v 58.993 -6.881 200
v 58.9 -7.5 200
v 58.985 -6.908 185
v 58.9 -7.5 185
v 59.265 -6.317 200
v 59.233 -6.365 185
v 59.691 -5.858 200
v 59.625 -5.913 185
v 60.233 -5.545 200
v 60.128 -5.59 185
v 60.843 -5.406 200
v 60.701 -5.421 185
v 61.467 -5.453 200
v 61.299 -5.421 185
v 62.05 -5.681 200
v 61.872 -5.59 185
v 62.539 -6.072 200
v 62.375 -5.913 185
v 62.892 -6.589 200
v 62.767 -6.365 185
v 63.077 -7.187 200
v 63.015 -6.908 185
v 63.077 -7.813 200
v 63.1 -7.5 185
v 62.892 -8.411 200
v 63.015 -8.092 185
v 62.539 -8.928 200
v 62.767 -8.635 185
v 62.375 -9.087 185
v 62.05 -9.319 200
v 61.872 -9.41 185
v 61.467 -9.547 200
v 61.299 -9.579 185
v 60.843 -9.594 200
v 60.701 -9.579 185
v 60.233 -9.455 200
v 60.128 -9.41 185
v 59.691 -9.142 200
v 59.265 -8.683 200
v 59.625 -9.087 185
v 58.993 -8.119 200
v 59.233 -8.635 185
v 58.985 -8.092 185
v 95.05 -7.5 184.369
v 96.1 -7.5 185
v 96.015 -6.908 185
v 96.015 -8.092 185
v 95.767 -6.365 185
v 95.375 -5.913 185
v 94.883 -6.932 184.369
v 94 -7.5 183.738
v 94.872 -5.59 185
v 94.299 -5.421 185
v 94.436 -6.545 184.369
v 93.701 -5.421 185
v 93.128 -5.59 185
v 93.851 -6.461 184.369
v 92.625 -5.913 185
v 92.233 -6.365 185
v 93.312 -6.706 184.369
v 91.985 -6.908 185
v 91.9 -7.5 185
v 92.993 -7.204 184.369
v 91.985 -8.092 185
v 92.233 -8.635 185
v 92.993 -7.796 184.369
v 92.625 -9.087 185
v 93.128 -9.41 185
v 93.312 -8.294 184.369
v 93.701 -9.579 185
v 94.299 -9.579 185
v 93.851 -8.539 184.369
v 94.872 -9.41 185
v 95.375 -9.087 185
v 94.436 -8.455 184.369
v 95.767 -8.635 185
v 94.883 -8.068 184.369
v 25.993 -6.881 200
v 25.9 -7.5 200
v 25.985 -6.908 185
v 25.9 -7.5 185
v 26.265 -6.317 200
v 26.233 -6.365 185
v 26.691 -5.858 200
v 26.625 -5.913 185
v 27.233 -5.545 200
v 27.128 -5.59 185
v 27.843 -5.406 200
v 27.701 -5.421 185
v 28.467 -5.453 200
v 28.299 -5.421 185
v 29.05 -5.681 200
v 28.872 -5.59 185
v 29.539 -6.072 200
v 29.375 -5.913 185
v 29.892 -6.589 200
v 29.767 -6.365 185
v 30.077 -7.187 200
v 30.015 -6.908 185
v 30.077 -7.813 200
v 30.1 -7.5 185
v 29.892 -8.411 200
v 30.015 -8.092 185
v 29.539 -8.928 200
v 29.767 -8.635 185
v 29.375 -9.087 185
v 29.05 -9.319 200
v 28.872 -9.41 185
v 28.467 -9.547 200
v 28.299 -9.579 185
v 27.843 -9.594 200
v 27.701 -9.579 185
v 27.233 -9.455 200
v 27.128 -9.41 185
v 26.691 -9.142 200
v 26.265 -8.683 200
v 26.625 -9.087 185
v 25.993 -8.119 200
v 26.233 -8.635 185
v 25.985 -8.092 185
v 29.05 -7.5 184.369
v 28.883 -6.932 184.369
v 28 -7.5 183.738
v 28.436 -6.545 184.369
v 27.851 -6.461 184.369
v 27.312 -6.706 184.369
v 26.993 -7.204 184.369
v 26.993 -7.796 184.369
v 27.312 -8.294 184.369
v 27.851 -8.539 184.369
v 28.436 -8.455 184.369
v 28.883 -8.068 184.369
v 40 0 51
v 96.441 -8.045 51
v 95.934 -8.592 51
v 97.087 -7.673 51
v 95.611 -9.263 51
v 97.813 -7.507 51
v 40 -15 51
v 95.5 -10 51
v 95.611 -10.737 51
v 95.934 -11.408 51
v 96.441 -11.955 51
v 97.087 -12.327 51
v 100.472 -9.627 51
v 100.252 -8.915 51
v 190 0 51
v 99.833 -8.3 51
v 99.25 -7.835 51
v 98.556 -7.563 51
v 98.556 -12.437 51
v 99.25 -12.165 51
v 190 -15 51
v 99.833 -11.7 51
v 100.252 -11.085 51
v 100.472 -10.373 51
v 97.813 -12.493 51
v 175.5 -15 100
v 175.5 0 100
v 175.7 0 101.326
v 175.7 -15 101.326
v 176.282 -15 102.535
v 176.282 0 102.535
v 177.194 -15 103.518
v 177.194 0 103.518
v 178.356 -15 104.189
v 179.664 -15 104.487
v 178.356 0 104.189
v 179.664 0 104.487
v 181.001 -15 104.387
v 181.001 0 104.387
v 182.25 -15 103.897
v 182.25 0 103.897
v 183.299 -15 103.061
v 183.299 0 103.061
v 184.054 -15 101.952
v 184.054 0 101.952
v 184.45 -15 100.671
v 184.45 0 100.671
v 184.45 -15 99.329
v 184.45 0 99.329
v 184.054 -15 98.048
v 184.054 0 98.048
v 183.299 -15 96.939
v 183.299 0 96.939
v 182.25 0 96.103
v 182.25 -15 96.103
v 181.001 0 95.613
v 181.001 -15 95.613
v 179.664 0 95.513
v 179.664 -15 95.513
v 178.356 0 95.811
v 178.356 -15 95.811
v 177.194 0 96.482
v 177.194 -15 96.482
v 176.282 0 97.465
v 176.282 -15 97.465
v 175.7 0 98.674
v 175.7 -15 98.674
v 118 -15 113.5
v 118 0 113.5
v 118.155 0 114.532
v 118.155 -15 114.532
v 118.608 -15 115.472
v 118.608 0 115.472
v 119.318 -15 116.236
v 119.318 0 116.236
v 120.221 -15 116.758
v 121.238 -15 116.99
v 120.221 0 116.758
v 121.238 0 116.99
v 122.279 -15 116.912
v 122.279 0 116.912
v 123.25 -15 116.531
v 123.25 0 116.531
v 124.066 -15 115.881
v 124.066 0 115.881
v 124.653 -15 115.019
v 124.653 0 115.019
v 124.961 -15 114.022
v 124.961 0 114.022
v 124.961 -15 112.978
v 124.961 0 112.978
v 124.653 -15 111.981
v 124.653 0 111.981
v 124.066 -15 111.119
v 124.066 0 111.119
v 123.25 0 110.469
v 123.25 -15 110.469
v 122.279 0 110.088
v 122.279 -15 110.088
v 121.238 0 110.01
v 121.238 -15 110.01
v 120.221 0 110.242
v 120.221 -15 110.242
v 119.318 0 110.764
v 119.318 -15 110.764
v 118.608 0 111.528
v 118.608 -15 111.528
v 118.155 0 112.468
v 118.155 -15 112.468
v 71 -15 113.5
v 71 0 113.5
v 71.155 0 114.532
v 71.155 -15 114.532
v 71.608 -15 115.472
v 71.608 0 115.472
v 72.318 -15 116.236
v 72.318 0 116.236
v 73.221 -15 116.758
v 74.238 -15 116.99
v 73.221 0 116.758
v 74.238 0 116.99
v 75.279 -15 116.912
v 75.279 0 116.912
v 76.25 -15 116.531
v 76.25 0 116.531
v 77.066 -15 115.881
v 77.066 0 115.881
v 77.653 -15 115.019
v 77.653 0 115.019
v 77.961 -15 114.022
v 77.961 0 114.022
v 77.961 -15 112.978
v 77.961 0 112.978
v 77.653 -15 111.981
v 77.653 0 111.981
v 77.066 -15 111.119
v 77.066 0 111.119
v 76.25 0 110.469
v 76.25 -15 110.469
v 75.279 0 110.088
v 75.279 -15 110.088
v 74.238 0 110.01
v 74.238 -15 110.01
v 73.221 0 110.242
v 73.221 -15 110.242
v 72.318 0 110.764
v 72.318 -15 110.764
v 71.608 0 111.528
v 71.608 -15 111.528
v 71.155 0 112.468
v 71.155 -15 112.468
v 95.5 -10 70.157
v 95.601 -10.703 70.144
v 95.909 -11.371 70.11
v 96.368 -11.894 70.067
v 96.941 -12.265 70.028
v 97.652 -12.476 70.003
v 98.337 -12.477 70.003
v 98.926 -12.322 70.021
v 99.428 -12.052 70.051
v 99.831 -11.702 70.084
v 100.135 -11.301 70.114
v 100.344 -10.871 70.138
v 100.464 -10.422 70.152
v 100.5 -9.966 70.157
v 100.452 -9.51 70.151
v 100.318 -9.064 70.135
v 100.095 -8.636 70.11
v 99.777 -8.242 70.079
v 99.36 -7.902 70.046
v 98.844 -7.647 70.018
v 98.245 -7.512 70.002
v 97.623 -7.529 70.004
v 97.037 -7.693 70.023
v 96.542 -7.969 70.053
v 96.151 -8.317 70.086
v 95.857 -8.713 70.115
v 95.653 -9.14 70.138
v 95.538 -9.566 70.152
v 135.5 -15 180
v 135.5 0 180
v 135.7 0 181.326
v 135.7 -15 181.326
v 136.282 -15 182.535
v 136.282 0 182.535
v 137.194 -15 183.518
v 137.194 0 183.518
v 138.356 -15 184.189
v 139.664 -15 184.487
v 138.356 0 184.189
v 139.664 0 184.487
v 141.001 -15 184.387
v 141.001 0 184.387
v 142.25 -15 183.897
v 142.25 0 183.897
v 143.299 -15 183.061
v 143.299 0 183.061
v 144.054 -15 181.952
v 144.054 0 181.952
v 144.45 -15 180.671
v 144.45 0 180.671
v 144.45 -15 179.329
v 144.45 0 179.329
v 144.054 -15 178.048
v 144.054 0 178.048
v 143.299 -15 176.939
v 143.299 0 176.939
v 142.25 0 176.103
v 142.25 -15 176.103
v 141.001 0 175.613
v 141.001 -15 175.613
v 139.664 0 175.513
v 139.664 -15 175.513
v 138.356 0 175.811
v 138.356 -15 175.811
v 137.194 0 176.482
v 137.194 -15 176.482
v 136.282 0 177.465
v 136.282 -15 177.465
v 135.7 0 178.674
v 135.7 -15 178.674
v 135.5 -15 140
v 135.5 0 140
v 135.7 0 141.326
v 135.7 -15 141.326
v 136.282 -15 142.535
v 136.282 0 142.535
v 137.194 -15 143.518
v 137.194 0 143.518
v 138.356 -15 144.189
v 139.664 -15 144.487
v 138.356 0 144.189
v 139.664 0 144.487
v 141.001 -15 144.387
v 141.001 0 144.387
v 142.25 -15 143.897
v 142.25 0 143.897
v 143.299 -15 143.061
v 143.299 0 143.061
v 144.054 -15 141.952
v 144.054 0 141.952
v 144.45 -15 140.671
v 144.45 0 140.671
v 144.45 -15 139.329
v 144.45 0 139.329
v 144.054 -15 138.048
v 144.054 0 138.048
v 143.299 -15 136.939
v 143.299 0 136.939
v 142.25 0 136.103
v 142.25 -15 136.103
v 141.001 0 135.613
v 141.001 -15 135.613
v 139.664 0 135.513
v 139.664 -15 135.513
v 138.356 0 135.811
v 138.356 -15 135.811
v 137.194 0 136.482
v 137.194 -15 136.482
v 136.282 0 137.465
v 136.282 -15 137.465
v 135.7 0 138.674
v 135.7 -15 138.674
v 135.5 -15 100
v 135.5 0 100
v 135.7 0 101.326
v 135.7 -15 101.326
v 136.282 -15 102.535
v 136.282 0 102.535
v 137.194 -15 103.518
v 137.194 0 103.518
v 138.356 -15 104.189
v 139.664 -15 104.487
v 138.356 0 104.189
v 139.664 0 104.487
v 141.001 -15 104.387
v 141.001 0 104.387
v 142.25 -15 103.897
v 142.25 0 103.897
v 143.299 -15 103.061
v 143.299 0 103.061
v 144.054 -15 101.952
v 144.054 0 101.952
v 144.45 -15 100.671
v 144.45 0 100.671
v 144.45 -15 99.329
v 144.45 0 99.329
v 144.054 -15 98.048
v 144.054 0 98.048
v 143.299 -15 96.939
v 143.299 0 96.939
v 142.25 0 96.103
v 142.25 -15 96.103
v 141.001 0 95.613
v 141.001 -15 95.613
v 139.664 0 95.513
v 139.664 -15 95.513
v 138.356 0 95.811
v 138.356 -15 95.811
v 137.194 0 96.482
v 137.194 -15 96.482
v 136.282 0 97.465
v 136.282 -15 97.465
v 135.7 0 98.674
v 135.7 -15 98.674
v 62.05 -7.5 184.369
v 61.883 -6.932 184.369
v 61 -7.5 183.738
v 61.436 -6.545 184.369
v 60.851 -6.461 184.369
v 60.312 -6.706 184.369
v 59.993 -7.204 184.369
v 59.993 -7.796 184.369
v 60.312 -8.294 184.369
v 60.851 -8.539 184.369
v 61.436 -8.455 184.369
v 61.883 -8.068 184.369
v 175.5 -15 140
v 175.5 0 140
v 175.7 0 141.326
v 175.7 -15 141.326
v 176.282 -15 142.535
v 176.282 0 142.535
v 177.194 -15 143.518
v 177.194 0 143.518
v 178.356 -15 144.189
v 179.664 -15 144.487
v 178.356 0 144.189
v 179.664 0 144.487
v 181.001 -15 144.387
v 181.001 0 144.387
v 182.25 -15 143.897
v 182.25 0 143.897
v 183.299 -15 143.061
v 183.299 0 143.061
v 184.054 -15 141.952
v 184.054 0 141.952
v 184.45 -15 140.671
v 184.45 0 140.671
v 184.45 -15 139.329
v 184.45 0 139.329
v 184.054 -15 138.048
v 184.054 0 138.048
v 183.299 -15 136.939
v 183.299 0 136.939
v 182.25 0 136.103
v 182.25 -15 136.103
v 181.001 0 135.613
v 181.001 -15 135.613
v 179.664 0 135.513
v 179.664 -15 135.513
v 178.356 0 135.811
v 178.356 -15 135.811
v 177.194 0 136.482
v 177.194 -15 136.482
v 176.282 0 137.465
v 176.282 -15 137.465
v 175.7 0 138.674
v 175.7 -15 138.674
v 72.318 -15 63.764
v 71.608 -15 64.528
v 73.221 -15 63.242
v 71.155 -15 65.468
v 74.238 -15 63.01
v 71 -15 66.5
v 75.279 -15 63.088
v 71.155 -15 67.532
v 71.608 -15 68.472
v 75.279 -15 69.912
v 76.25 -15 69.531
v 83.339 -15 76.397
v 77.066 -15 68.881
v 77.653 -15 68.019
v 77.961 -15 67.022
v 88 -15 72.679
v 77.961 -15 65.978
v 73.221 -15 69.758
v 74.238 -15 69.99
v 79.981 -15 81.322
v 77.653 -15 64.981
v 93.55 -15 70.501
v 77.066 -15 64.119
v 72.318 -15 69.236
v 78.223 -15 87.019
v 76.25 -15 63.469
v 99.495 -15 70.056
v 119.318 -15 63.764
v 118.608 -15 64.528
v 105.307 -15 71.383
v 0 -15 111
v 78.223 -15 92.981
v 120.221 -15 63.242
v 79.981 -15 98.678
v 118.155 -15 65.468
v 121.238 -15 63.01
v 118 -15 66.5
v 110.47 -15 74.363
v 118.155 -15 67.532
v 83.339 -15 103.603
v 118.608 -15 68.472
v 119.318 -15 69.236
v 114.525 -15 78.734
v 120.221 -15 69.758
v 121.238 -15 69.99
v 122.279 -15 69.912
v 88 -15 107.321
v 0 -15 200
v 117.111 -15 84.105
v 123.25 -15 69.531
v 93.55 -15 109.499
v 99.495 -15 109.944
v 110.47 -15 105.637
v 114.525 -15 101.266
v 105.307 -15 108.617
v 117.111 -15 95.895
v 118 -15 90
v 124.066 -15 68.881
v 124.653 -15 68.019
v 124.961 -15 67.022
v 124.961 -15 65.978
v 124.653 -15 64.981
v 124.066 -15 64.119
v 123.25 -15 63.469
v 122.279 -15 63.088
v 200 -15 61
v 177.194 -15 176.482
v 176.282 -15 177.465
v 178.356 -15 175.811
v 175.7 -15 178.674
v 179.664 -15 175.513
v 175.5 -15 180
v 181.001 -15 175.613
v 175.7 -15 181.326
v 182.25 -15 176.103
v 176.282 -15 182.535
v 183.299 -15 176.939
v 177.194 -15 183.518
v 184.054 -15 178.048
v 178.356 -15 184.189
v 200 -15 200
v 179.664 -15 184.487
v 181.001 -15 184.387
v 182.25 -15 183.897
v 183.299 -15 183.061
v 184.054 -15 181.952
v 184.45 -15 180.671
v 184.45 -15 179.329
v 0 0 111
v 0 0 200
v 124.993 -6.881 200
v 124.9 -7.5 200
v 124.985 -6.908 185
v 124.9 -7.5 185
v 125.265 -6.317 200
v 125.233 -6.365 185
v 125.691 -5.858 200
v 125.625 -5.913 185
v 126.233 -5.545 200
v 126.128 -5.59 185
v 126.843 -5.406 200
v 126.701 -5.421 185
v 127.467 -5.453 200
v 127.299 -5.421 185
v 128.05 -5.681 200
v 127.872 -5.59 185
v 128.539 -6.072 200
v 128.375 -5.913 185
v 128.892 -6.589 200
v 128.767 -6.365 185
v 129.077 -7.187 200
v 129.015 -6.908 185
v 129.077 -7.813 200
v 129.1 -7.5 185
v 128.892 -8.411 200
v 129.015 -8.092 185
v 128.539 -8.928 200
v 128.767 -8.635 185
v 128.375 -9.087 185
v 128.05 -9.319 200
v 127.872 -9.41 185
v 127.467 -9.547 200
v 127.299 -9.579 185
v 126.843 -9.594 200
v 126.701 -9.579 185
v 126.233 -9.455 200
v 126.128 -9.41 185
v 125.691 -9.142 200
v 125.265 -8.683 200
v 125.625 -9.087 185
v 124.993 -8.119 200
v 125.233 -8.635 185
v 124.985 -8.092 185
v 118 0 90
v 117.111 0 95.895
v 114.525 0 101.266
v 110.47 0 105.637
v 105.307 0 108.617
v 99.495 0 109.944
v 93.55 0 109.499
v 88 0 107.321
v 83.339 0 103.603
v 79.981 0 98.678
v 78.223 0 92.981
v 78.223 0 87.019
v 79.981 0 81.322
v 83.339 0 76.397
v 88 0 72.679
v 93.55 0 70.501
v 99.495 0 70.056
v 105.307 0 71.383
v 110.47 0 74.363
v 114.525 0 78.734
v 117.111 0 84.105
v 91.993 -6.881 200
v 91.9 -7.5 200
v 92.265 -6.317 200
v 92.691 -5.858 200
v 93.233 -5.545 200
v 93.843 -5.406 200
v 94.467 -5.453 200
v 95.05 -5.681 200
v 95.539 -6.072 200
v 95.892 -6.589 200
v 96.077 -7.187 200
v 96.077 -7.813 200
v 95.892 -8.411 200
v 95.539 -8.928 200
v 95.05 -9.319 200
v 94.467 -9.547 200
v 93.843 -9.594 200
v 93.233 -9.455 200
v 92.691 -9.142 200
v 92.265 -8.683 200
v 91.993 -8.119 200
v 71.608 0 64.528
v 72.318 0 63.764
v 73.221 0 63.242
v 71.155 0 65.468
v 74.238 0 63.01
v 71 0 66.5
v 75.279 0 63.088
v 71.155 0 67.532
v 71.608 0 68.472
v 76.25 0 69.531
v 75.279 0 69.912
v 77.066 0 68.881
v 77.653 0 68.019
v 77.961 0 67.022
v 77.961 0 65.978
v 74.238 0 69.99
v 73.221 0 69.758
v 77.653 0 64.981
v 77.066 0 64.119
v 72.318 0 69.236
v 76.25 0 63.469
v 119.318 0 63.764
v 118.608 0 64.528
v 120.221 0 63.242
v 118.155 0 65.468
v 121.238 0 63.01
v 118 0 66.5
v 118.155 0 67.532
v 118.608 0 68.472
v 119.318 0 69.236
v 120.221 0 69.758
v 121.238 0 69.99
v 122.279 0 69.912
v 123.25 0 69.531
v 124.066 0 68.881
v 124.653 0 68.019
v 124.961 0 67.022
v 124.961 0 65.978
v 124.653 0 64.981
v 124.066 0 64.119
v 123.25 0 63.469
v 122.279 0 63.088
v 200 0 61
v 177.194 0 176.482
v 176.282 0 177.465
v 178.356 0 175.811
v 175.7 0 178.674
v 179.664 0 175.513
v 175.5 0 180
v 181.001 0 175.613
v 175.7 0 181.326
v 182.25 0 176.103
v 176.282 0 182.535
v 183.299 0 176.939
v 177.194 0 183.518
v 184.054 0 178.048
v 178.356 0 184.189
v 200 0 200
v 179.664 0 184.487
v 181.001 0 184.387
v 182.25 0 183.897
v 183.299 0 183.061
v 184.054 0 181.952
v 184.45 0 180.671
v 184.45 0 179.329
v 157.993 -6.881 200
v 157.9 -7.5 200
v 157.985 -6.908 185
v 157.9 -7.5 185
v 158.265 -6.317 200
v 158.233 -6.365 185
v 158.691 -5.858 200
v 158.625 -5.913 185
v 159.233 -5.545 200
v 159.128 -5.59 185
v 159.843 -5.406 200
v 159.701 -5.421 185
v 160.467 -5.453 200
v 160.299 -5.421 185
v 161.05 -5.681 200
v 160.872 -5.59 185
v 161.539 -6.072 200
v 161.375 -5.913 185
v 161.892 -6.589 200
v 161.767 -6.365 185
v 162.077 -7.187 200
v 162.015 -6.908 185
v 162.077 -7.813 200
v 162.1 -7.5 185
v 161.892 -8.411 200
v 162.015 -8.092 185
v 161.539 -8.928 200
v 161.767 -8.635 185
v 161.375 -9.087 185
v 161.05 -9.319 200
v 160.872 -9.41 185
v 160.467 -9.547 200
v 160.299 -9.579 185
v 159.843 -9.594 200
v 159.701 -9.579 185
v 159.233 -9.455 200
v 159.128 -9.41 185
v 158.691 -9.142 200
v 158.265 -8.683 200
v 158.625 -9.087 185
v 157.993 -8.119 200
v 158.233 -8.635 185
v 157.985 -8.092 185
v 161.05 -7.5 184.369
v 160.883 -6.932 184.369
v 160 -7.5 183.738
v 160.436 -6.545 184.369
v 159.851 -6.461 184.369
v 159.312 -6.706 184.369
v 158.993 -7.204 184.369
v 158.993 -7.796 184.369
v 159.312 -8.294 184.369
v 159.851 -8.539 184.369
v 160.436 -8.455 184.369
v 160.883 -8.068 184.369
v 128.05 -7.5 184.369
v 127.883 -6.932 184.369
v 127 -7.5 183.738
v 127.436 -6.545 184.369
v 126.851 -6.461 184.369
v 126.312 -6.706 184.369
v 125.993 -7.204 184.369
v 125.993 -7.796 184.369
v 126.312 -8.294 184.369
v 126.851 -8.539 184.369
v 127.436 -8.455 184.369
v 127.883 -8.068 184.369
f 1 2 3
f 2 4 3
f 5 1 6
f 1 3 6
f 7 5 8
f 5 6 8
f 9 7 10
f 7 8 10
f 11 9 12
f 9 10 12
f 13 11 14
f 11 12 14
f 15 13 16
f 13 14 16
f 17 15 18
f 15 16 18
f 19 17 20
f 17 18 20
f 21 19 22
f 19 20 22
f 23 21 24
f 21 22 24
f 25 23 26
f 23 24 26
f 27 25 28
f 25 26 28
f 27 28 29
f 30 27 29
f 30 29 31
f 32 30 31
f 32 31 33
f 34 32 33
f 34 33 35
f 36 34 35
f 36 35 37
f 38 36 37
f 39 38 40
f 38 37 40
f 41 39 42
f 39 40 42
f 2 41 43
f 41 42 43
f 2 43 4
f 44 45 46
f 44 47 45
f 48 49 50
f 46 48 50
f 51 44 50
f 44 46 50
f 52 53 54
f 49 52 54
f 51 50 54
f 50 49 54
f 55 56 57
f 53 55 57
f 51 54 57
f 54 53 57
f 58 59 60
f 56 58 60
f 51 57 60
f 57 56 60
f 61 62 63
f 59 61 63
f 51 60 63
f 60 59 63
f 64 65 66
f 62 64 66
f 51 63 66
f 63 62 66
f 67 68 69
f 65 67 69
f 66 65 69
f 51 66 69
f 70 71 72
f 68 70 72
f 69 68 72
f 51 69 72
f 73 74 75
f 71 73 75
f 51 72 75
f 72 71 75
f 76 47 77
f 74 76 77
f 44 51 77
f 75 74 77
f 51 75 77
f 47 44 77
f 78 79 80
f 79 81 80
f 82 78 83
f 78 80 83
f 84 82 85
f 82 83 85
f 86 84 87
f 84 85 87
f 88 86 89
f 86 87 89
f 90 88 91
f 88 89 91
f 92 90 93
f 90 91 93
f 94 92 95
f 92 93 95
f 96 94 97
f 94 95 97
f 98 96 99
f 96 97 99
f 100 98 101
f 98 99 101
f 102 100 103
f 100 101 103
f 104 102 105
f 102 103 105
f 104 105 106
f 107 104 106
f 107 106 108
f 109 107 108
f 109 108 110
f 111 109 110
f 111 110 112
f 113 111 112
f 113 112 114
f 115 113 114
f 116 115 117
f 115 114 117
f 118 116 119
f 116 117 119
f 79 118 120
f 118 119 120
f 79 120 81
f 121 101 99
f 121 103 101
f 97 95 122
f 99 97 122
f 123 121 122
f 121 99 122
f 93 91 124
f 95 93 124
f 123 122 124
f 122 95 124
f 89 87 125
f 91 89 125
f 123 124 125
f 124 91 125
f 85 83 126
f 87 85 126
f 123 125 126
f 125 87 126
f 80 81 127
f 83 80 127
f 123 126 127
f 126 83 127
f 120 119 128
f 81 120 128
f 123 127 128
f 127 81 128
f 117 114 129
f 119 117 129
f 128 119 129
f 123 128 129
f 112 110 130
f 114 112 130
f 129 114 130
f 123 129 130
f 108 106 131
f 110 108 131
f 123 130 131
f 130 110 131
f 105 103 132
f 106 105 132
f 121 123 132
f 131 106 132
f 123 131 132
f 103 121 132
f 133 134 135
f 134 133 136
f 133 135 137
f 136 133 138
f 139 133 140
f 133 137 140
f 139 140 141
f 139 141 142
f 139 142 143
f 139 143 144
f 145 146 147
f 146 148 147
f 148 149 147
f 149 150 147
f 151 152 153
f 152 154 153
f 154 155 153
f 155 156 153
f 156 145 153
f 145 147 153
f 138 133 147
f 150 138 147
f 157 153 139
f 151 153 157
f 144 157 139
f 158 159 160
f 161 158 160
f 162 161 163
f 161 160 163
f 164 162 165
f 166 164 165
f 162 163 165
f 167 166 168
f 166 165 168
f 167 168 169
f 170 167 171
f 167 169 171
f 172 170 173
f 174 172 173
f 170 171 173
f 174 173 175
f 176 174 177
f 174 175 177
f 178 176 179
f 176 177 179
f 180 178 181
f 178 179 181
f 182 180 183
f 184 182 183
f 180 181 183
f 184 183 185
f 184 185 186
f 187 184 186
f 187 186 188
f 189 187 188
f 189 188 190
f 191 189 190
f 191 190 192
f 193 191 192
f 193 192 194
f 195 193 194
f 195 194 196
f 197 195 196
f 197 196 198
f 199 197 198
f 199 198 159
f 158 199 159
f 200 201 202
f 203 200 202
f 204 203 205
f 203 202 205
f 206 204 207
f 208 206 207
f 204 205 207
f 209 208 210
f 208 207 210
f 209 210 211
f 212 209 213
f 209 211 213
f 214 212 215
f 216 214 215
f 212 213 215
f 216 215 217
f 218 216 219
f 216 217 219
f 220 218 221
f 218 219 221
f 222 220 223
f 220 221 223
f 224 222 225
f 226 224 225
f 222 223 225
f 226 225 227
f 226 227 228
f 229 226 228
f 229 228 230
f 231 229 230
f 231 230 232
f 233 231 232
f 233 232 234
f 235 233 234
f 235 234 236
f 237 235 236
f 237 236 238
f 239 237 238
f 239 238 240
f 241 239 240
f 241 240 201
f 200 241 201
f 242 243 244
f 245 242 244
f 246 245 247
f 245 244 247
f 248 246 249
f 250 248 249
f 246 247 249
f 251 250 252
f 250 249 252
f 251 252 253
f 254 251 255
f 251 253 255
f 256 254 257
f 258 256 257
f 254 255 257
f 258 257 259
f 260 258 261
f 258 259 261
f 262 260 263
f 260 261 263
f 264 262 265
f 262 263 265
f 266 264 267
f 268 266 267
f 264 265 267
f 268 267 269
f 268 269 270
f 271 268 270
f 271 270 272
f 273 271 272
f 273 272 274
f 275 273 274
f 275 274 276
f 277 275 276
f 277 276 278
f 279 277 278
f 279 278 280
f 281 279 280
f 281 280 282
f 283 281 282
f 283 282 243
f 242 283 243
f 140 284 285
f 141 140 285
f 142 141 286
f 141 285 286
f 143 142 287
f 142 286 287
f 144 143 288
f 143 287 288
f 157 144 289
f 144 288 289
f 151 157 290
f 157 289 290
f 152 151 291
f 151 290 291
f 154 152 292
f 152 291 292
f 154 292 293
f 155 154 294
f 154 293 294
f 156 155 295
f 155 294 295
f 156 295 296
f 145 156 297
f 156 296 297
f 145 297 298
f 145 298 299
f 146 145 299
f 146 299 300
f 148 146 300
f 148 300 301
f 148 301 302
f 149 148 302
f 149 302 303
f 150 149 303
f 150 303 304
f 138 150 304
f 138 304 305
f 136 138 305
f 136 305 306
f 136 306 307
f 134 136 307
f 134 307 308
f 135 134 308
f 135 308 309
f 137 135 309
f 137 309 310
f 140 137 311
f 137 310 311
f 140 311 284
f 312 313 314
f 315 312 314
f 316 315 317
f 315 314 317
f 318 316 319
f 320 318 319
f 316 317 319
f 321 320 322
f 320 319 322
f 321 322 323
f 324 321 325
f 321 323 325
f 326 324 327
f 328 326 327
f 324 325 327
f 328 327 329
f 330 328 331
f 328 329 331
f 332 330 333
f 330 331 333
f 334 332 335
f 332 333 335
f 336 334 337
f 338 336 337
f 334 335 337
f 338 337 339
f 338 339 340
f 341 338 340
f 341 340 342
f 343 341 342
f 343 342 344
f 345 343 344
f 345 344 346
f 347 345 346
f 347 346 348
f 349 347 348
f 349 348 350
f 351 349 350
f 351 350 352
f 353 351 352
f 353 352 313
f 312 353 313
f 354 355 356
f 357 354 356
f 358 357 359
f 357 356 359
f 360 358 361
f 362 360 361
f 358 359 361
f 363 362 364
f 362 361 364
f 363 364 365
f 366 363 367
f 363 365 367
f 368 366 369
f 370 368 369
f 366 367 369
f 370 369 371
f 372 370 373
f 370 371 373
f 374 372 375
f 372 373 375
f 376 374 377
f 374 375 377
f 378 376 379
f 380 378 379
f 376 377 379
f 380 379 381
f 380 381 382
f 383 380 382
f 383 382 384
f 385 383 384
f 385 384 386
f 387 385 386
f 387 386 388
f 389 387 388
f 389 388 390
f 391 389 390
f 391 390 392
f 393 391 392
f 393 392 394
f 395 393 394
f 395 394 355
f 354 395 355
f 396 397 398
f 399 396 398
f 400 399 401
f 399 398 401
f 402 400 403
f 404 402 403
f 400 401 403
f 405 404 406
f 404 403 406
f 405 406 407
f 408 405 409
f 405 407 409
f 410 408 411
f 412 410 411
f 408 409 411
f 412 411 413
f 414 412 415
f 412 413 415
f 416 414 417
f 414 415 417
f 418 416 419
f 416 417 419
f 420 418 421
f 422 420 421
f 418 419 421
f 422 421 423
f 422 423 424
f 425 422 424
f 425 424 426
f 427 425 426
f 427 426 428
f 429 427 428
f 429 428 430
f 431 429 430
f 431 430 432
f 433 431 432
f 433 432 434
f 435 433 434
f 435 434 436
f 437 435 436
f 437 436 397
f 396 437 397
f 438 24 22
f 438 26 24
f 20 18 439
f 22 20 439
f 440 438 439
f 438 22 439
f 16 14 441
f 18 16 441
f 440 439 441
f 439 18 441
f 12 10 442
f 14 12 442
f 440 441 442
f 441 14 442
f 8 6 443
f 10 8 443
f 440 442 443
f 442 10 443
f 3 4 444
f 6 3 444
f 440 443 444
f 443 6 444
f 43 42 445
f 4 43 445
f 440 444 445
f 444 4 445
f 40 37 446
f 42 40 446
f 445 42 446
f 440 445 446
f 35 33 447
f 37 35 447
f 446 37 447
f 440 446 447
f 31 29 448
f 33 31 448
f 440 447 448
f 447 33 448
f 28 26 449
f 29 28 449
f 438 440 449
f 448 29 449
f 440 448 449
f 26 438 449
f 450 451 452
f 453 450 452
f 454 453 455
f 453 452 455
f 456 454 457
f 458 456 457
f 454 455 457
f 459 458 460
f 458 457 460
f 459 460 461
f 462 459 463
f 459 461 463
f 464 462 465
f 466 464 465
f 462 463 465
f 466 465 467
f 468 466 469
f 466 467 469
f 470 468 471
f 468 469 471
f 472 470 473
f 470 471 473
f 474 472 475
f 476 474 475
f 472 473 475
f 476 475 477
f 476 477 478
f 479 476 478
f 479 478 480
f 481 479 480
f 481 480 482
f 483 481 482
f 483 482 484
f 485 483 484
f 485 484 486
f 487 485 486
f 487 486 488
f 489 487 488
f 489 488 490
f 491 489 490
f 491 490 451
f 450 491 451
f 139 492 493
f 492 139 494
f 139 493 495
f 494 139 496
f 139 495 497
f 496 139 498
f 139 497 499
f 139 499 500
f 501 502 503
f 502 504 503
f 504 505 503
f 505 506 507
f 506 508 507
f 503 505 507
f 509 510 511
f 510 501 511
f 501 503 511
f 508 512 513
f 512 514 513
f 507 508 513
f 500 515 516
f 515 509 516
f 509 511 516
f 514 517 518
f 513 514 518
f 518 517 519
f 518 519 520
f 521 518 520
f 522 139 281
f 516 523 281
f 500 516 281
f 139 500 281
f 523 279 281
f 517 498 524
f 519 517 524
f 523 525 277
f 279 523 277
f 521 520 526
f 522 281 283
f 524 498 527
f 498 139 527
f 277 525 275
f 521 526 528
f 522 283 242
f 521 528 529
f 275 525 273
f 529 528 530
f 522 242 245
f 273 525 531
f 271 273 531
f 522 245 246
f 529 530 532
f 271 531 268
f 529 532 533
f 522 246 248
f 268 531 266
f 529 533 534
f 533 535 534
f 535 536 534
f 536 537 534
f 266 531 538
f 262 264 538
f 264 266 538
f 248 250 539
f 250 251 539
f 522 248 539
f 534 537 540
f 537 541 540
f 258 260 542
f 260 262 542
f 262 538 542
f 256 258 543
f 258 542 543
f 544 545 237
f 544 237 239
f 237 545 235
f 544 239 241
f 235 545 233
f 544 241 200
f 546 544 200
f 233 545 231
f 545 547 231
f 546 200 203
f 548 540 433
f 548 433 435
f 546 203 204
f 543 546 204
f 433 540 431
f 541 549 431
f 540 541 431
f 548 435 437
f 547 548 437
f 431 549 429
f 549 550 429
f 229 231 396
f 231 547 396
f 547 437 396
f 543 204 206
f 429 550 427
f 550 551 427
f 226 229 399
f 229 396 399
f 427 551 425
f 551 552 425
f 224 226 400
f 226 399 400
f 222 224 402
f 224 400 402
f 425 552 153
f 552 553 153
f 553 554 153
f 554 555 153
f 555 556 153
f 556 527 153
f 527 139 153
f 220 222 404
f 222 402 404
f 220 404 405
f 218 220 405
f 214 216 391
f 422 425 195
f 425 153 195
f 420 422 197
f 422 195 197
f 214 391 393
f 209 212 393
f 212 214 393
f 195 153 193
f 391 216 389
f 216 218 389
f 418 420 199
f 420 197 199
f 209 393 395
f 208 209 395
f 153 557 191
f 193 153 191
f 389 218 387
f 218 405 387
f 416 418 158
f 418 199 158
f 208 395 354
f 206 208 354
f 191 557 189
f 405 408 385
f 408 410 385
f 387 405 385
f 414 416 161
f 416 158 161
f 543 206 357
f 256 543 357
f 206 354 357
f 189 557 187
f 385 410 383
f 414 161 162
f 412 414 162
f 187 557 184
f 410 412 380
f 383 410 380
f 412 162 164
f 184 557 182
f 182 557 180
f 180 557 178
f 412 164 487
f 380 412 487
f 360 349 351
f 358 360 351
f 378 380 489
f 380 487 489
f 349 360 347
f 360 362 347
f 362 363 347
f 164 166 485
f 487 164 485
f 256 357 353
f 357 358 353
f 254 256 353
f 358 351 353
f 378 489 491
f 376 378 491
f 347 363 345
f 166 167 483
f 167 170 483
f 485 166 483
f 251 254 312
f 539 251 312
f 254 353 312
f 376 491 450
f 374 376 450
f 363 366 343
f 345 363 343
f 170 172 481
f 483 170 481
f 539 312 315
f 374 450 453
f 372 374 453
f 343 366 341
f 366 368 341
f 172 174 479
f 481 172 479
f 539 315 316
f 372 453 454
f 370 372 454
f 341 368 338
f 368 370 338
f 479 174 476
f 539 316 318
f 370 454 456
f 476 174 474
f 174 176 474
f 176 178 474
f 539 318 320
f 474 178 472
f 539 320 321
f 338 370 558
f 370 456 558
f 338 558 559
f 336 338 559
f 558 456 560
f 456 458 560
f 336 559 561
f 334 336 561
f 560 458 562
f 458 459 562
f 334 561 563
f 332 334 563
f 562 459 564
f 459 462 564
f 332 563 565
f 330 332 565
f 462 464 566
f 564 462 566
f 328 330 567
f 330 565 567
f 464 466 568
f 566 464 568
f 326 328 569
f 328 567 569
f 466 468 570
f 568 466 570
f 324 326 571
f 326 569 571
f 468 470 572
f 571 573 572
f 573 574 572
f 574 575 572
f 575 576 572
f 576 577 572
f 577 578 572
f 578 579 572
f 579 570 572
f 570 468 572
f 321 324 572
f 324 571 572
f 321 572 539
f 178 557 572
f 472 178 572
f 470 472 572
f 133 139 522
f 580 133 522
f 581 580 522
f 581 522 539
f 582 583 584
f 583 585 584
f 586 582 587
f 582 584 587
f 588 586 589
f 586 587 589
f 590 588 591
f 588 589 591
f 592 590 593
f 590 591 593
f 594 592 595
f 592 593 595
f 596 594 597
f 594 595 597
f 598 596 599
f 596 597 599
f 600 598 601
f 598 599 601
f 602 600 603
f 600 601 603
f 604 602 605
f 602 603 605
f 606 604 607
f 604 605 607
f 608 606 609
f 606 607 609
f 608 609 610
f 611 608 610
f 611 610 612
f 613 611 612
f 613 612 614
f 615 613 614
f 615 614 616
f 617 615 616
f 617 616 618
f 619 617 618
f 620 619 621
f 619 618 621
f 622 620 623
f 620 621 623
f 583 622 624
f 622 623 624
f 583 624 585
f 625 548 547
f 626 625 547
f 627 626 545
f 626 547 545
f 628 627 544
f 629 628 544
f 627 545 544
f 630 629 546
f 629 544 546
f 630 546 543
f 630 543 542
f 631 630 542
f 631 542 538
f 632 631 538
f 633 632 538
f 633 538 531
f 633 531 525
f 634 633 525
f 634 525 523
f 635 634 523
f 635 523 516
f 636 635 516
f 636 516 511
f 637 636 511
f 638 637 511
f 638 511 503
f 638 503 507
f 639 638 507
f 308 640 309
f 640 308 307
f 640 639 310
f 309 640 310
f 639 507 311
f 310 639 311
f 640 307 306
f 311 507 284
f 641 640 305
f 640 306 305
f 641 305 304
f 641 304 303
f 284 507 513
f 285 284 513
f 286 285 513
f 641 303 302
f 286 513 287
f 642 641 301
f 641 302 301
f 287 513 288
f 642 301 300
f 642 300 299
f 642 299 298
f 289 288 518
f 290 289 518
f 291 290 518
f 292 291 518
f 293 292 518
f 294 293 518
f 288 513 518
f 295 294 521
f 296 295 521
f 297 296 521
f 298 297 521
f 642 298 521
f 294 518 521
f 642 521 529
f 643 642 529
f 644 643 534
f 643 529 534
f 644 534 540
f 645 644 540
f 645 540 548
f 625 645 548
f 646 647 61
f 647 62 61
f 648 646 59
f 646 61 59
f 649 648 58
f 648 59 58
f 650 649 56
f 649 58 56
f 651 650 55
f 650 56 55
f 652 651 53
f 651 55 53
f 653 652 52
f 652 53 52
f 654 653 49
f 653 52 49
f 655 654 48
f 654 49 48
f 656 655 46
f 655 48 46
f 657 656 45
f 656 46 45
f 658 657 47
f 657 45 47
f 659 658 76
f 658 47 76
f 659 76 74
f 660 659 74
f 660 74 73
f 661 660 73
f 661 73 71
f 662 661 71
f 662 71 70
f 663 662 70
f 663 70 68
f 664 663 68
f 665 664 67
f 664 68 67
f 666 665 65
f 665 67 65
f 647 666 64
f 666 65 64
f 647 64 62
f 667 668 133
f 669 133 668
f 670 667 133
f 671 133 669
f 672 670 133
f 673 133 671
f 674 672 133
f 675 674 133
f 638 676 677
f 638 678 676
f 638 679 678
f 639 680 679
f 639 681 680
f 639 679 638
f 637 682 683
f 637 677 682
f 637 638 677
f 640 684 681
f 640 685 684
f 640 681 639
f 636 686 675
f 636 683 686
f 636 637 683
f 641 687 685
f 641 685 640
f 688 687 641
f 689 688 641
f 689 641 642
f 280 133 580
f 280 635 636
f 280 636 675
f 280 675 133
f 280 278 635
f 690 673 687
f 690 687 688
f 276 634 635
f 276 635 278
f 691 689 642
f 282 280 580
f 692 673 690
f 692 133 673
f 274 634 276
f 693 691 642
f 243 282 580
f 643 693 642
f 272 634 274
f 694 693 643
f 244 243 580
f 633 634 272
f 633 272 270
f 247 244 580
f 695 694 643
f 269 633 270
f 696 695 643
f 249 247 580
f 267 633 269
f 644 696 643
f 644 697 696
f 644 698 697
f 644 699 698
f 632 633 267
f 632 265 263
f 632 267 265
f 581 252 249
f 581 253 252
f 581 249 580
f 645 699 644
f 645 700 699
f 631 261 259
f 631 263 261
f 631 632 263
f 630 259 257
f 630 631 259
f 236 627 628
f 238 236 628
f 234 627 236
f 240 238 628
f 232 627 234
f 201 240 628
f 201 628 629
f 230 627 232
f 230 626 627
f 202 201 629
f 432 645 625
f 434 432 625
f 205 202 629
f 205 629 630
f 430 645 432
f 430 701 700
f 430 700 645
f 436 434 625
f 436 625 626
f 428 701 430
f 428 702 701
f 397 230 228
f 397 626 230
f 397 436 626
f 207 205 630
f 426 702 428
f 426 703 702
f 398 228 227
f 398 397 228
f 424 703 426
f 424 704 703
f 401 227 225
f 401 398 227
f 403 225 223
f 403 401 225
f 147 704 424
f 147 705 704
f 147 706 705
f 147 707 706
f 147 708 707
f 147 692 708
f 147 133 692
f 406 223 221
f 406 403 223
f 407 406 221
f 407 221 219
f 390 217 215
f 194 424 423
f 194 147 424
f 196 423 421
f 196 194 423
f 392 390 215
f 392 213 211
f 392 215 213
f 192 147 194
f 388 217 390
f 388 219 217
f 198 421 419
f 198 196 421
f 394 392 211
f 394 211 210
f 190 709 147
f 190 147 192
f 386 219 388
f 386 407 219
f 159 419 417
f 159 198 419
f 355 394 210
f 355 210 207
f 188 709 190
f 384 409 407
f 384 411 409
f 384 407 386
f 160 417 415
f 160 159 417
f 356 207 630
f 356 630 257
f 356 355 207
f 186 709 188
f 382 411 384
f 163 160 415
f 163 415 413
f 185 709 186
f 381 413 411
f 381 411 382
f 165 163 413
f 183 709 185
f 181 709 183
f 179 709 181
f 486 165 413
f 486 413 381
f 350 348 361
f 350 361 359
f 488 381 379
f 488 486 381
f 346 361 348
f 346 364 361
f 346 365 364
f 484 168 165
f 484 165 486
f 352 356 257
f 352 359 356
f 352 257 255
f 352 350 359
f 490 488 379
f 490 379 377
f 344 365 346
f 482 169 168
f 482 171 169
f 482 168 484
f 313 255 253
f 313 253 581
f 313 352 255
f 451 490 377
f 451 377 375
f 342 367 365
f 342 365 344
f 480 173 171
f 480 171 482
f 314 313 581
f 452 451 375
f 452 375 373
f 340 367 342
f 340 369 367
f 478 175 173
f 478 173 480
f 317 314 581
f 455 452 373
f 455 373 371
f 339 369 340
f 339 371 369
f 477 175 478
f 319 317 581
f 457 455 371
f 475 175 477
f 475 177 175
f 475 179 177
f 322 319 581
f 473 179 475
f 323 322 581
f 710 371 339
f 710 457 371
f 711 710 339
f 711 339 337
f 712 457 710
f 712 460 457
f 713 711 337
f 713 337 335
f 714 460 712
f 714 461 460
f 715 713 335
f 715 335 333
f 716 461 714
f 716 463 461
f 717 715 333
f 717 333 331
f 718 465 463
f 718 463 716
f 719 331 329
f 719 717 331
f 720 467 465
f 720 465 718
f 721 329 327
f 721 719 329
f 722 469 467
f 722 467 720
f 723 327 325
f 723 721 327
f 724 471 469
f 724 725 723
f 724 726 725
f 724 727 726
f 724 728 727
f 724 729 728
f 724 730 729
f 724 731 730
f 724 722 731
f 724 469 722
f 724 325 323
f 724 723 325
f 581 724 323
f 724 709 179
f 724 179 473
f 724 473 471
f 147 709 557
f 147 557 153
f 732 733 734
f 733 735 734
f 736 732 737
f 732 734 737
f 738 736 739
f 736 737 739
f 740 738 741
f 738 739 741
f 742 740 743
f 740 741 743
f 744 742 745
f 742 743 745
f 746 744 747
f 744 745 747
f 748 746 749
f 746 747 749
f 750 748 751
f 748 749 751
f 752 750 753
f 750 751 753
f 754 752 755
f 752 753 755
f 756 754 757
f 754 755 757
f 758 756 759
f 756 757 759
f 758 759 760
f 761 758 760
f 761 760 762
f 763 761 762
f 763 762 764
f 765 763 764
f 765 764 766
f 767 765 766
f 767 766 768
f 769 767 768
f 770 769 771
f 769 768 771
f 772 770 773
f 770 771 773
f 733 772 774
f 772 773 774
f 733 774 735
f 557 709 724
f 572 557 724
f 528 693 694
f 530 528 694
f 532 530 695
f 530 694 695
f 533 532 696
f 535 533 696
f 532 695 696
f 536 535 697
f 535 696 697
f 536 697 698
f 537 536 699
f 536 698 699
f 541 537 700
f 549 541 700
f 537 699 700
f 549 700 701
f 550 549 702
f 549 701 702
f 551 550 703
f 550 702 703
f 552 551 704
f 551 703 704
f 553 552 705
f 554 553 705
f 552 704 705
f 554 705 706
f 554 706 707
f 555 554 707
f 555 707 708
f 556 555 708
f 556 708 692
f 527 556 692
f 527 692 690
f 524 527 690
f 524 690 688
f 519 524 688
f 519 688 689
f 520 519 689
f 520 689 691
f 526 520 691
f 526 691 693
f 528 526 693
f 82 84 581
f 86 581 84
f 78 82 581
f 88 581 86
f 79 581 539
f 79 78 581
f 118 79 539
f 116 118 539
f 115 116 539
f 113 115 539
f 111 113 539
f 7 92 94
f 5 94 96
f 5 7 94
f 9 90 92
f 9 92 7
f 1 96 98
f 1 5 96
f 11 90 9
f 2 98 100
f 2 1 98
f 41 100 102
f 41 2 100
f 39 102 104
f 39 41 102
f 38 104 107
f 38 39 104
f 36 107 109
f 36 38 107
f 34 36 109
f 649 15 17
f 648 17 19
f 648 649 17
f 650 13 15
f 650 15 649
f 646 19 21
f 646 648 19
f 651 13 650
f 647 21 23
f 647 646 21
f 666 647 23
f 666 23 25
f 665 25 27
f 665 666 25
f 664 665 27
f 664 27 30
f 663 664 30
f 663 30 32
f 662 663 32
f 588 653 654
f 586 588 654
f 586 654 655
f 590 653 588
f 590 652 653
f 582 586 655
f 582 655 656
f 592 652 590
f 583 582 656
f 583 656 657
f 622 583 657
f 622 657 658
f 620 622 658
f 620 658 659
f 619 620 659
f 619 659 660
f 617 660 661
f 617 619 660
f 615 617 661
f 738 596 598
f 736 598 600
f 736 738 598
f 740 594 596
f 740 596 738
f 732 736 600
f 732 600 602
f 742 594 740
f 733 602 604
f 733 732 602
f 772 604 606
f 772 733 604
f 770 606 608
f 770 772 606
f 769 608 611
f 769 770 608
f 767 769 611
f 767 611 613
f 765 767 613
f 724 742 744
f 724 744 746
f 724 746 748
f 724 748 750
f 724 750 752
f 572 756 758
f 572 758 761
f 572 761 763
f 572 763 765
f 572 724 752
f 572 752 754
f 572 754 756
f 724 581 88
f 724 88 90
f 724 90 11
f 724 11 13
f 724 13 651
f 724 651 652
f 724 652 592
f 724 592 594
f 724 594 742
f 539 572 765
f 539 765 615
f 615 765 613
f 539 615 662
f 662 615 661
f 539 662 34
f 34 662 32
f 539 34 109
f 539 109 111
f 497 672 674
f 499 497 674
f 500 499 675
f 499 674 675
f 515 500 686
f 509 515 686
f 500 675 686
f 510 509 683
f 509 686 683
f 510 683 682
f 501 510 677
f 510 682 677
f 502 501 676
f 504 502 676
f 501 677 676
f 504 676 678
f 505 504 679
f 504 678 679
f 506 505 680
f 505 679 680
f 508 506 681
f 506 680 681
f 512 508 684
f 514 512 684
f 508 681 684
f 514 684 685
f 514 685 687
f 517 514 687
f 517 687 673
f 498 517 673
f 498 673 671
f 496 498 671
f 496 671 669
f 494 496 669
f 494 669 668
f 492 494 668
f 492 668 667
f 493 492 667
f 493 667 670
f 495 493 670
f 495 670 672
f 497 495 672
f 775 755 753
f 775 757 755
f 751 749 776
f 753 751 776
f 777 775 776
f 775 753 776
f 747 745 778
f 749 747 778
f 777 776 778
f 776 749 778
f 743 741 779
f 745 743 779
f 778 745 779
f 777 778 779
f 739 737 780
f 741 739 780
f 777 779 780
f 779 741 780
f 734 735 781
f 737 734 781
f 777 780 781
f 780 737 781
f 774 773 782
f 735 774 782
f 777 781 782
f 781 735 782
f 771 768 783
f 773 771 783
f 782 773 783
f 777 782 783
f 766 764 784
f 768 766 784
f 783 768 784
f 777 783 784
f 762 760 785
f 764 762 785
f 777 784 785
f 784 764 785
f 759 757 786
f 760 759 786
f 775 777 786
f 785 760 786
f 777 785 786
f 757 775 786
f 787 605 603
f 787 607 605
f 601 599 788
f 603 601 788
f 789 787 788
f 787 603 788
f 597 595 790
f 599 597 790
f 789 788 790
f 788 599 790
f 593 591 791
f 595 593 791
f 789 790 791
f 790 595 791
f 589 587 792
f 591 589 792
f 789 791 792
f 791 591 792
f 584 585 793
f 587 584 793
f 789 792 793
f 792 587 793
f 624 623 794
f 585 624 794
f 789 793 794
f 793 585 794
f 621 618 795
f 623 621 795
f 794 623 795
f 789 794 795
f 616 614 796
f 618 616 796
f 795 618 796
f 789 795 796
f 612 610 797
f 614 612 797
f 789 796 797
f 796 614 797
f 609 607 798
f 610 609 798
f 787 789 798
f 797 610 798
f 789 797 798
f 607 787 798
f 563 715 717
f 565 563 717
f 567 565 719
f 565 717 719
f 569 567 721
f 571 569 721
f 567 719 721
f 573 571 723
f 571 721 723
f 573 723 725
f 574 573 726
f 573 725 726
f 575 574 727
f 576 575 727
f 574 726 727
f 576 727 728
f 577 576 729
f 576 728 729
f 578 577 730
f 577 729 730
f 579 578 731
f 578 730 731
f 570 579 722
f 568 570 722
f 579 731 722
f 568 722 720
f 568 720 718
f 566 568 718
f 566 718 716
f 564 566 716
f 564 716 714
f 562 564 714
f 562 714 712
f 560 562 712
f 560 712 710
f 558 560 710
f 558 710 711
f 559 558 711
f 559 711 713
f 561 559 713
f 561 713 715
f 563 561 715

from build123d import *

# Parameters (mm, degrees)
F0_W      = 200
F0_H      = 200
F1_DEPTH  = 15
F2_R      = 20
F3_DEPTH  = 25
F4_DEPTH  = 25
F5_DEPTH  = 26
F6_DEPTH  = 30
F7_DEPTH  = 29
F9_DEPTH  = 25
F11_D     = 9
F12_D     = 7
F14_D     = 5
F14_DEPTH = 20
F14_TIP   = 1.5021515476
F15_DEPTH = 4
F16_DEPTH = 55
F18_DEPTH = 25
F20_D     = 4.2
F20_DEPTH = 15
F20_TIP   = 1.2618073


with BuildPart() as f1:
    # F0 (on Front) → F1 (new body)
    with BuildSketch(Plane.XZ):
        with Locations((100, 100)):
            Rectangle(F0_W, F0_H)
    extrude(amount=F1_DEPTH)

    # F2 (on face) → F3 (cut)
    with BuildSketch(Plane.XZ.offset(15)):
        with Locations((98, 90)):
            Circle(F2_R)
    extrude(amount=-F3_DEPTH, mode=Mode.SUBTRACT)

    # F4 (cut): a face of the model
    f4_faces = [f1.faces().sort_by_distance(p)[0] for p in [
        (100, -7.5, 0),
    ]]
    extrude(f4_faces, amount=-F4_DEPTH, mode=Mode.SUBTRACT)

    # F5 (cut): a face of the model
    f5_faces = [f1.faces().sort_by_distance(p)[0] for p in [
        (100, -7.5, 25),
    ]]
    extrude(f5_faces, amount=-F5_DEPTH, mode=Mode.SUBTRACT)

    # F6 (cut): a face of the model
    f6_faces = [f1.faces().sort_by_distance(p)[0] for p in [
        (0, -7.5, 125.5),
    ]]
    extrude(f6_faces, amount=-F6_DEPTH, mode=Mode.SUBTRACT)

    # F7 (cut): a face of the model
    f7_faces = [f1.faces().sort_by_distance(p)[0] for p in [
        (30, -7.5, 125.5),
    ]]
    extrude(f7_faces, amount=-F7_DEPTH, mode=Mode.SUBTRACT)

    # F8 (on face) → F9 (cut)
    with BuildSketch(Plane.XZ.offset(15)):
        Polygon((200, 51), (200, 61), (190, 51), align=None)
    extrude(amount=-F9_DEPTH, mode=Mode.SUBTRACT)

    # F11 (through all)
    with Locations(Plane.XZ.offset(15)):
        with Locations((180, 100), (180, 140), (180, 180), (140, 180), (140, 140), (140, 100)):
            Hole(F11_D / 2)

    # F12 (through all)
    with Locations(Plane.XZ.offset(15)):
        with Locations((121.5, 66.5), (121.5, 113.5), (74.5, 66.5), (74.5, 113.5)):
            Hole(F12_D / 2)

    # F14
    with Locations(Plane(origin=(0, 0, 51), x_dir=(1, 0, 0), z_dir=(0, 0, -1))):
        with Locations((98, 10)):
            Hole(F14_D / 2, depth=F14_DEPTH)
            with Locations((0, 0, -(F14_DEPTH + F14_TIP / 2))):  # 118° drill point
                Cone(0, F14_D / 2, F14_TIP, mode=Mode.SUBTRACT)

    # F15 (add): a face of the model
    f15_faces = [f1.faces().sort_by_distance(p)[0] for p in [
        (59, -7.5, 125.5),
    ]]
    extrude(f15_faces, amount=F15_DEPTH)

    # F16 (add): a face of the model
    f16_faces = [f1.faces().sort_by_distance(p)[0] for p in [
        (55, -7.5, 125.5),
    ]]
    extrude(f16_faces, amount=F16_DEPTH)

    # F17 (on face) → F18 (cut)
    with BuildSketch(Plane.XZ.offset(15)):
        Polygon((0, 111), (0, 51), (40, 51), align=None)
    extrude(amount=-F18_DEPTH, mode=Mode.SUBTRACT)

    # F20
    with Locations(Plane.XY.offset(200)):
        with Locations((28, -7.5), (61, -7.5), (94, -7.5), (127, -7.5), (160, -7.5)):
            Hole(F20_D / 2, depth=F20_DEPTH)
            with Locations((0, 0, -(F20_DEPTH + F20_TIP / 2))):  # 118° drill point
                Cone(0, F20_D / 2, F20_TIP, mode=Mode.SUBTRACT)


solid = f1.part
